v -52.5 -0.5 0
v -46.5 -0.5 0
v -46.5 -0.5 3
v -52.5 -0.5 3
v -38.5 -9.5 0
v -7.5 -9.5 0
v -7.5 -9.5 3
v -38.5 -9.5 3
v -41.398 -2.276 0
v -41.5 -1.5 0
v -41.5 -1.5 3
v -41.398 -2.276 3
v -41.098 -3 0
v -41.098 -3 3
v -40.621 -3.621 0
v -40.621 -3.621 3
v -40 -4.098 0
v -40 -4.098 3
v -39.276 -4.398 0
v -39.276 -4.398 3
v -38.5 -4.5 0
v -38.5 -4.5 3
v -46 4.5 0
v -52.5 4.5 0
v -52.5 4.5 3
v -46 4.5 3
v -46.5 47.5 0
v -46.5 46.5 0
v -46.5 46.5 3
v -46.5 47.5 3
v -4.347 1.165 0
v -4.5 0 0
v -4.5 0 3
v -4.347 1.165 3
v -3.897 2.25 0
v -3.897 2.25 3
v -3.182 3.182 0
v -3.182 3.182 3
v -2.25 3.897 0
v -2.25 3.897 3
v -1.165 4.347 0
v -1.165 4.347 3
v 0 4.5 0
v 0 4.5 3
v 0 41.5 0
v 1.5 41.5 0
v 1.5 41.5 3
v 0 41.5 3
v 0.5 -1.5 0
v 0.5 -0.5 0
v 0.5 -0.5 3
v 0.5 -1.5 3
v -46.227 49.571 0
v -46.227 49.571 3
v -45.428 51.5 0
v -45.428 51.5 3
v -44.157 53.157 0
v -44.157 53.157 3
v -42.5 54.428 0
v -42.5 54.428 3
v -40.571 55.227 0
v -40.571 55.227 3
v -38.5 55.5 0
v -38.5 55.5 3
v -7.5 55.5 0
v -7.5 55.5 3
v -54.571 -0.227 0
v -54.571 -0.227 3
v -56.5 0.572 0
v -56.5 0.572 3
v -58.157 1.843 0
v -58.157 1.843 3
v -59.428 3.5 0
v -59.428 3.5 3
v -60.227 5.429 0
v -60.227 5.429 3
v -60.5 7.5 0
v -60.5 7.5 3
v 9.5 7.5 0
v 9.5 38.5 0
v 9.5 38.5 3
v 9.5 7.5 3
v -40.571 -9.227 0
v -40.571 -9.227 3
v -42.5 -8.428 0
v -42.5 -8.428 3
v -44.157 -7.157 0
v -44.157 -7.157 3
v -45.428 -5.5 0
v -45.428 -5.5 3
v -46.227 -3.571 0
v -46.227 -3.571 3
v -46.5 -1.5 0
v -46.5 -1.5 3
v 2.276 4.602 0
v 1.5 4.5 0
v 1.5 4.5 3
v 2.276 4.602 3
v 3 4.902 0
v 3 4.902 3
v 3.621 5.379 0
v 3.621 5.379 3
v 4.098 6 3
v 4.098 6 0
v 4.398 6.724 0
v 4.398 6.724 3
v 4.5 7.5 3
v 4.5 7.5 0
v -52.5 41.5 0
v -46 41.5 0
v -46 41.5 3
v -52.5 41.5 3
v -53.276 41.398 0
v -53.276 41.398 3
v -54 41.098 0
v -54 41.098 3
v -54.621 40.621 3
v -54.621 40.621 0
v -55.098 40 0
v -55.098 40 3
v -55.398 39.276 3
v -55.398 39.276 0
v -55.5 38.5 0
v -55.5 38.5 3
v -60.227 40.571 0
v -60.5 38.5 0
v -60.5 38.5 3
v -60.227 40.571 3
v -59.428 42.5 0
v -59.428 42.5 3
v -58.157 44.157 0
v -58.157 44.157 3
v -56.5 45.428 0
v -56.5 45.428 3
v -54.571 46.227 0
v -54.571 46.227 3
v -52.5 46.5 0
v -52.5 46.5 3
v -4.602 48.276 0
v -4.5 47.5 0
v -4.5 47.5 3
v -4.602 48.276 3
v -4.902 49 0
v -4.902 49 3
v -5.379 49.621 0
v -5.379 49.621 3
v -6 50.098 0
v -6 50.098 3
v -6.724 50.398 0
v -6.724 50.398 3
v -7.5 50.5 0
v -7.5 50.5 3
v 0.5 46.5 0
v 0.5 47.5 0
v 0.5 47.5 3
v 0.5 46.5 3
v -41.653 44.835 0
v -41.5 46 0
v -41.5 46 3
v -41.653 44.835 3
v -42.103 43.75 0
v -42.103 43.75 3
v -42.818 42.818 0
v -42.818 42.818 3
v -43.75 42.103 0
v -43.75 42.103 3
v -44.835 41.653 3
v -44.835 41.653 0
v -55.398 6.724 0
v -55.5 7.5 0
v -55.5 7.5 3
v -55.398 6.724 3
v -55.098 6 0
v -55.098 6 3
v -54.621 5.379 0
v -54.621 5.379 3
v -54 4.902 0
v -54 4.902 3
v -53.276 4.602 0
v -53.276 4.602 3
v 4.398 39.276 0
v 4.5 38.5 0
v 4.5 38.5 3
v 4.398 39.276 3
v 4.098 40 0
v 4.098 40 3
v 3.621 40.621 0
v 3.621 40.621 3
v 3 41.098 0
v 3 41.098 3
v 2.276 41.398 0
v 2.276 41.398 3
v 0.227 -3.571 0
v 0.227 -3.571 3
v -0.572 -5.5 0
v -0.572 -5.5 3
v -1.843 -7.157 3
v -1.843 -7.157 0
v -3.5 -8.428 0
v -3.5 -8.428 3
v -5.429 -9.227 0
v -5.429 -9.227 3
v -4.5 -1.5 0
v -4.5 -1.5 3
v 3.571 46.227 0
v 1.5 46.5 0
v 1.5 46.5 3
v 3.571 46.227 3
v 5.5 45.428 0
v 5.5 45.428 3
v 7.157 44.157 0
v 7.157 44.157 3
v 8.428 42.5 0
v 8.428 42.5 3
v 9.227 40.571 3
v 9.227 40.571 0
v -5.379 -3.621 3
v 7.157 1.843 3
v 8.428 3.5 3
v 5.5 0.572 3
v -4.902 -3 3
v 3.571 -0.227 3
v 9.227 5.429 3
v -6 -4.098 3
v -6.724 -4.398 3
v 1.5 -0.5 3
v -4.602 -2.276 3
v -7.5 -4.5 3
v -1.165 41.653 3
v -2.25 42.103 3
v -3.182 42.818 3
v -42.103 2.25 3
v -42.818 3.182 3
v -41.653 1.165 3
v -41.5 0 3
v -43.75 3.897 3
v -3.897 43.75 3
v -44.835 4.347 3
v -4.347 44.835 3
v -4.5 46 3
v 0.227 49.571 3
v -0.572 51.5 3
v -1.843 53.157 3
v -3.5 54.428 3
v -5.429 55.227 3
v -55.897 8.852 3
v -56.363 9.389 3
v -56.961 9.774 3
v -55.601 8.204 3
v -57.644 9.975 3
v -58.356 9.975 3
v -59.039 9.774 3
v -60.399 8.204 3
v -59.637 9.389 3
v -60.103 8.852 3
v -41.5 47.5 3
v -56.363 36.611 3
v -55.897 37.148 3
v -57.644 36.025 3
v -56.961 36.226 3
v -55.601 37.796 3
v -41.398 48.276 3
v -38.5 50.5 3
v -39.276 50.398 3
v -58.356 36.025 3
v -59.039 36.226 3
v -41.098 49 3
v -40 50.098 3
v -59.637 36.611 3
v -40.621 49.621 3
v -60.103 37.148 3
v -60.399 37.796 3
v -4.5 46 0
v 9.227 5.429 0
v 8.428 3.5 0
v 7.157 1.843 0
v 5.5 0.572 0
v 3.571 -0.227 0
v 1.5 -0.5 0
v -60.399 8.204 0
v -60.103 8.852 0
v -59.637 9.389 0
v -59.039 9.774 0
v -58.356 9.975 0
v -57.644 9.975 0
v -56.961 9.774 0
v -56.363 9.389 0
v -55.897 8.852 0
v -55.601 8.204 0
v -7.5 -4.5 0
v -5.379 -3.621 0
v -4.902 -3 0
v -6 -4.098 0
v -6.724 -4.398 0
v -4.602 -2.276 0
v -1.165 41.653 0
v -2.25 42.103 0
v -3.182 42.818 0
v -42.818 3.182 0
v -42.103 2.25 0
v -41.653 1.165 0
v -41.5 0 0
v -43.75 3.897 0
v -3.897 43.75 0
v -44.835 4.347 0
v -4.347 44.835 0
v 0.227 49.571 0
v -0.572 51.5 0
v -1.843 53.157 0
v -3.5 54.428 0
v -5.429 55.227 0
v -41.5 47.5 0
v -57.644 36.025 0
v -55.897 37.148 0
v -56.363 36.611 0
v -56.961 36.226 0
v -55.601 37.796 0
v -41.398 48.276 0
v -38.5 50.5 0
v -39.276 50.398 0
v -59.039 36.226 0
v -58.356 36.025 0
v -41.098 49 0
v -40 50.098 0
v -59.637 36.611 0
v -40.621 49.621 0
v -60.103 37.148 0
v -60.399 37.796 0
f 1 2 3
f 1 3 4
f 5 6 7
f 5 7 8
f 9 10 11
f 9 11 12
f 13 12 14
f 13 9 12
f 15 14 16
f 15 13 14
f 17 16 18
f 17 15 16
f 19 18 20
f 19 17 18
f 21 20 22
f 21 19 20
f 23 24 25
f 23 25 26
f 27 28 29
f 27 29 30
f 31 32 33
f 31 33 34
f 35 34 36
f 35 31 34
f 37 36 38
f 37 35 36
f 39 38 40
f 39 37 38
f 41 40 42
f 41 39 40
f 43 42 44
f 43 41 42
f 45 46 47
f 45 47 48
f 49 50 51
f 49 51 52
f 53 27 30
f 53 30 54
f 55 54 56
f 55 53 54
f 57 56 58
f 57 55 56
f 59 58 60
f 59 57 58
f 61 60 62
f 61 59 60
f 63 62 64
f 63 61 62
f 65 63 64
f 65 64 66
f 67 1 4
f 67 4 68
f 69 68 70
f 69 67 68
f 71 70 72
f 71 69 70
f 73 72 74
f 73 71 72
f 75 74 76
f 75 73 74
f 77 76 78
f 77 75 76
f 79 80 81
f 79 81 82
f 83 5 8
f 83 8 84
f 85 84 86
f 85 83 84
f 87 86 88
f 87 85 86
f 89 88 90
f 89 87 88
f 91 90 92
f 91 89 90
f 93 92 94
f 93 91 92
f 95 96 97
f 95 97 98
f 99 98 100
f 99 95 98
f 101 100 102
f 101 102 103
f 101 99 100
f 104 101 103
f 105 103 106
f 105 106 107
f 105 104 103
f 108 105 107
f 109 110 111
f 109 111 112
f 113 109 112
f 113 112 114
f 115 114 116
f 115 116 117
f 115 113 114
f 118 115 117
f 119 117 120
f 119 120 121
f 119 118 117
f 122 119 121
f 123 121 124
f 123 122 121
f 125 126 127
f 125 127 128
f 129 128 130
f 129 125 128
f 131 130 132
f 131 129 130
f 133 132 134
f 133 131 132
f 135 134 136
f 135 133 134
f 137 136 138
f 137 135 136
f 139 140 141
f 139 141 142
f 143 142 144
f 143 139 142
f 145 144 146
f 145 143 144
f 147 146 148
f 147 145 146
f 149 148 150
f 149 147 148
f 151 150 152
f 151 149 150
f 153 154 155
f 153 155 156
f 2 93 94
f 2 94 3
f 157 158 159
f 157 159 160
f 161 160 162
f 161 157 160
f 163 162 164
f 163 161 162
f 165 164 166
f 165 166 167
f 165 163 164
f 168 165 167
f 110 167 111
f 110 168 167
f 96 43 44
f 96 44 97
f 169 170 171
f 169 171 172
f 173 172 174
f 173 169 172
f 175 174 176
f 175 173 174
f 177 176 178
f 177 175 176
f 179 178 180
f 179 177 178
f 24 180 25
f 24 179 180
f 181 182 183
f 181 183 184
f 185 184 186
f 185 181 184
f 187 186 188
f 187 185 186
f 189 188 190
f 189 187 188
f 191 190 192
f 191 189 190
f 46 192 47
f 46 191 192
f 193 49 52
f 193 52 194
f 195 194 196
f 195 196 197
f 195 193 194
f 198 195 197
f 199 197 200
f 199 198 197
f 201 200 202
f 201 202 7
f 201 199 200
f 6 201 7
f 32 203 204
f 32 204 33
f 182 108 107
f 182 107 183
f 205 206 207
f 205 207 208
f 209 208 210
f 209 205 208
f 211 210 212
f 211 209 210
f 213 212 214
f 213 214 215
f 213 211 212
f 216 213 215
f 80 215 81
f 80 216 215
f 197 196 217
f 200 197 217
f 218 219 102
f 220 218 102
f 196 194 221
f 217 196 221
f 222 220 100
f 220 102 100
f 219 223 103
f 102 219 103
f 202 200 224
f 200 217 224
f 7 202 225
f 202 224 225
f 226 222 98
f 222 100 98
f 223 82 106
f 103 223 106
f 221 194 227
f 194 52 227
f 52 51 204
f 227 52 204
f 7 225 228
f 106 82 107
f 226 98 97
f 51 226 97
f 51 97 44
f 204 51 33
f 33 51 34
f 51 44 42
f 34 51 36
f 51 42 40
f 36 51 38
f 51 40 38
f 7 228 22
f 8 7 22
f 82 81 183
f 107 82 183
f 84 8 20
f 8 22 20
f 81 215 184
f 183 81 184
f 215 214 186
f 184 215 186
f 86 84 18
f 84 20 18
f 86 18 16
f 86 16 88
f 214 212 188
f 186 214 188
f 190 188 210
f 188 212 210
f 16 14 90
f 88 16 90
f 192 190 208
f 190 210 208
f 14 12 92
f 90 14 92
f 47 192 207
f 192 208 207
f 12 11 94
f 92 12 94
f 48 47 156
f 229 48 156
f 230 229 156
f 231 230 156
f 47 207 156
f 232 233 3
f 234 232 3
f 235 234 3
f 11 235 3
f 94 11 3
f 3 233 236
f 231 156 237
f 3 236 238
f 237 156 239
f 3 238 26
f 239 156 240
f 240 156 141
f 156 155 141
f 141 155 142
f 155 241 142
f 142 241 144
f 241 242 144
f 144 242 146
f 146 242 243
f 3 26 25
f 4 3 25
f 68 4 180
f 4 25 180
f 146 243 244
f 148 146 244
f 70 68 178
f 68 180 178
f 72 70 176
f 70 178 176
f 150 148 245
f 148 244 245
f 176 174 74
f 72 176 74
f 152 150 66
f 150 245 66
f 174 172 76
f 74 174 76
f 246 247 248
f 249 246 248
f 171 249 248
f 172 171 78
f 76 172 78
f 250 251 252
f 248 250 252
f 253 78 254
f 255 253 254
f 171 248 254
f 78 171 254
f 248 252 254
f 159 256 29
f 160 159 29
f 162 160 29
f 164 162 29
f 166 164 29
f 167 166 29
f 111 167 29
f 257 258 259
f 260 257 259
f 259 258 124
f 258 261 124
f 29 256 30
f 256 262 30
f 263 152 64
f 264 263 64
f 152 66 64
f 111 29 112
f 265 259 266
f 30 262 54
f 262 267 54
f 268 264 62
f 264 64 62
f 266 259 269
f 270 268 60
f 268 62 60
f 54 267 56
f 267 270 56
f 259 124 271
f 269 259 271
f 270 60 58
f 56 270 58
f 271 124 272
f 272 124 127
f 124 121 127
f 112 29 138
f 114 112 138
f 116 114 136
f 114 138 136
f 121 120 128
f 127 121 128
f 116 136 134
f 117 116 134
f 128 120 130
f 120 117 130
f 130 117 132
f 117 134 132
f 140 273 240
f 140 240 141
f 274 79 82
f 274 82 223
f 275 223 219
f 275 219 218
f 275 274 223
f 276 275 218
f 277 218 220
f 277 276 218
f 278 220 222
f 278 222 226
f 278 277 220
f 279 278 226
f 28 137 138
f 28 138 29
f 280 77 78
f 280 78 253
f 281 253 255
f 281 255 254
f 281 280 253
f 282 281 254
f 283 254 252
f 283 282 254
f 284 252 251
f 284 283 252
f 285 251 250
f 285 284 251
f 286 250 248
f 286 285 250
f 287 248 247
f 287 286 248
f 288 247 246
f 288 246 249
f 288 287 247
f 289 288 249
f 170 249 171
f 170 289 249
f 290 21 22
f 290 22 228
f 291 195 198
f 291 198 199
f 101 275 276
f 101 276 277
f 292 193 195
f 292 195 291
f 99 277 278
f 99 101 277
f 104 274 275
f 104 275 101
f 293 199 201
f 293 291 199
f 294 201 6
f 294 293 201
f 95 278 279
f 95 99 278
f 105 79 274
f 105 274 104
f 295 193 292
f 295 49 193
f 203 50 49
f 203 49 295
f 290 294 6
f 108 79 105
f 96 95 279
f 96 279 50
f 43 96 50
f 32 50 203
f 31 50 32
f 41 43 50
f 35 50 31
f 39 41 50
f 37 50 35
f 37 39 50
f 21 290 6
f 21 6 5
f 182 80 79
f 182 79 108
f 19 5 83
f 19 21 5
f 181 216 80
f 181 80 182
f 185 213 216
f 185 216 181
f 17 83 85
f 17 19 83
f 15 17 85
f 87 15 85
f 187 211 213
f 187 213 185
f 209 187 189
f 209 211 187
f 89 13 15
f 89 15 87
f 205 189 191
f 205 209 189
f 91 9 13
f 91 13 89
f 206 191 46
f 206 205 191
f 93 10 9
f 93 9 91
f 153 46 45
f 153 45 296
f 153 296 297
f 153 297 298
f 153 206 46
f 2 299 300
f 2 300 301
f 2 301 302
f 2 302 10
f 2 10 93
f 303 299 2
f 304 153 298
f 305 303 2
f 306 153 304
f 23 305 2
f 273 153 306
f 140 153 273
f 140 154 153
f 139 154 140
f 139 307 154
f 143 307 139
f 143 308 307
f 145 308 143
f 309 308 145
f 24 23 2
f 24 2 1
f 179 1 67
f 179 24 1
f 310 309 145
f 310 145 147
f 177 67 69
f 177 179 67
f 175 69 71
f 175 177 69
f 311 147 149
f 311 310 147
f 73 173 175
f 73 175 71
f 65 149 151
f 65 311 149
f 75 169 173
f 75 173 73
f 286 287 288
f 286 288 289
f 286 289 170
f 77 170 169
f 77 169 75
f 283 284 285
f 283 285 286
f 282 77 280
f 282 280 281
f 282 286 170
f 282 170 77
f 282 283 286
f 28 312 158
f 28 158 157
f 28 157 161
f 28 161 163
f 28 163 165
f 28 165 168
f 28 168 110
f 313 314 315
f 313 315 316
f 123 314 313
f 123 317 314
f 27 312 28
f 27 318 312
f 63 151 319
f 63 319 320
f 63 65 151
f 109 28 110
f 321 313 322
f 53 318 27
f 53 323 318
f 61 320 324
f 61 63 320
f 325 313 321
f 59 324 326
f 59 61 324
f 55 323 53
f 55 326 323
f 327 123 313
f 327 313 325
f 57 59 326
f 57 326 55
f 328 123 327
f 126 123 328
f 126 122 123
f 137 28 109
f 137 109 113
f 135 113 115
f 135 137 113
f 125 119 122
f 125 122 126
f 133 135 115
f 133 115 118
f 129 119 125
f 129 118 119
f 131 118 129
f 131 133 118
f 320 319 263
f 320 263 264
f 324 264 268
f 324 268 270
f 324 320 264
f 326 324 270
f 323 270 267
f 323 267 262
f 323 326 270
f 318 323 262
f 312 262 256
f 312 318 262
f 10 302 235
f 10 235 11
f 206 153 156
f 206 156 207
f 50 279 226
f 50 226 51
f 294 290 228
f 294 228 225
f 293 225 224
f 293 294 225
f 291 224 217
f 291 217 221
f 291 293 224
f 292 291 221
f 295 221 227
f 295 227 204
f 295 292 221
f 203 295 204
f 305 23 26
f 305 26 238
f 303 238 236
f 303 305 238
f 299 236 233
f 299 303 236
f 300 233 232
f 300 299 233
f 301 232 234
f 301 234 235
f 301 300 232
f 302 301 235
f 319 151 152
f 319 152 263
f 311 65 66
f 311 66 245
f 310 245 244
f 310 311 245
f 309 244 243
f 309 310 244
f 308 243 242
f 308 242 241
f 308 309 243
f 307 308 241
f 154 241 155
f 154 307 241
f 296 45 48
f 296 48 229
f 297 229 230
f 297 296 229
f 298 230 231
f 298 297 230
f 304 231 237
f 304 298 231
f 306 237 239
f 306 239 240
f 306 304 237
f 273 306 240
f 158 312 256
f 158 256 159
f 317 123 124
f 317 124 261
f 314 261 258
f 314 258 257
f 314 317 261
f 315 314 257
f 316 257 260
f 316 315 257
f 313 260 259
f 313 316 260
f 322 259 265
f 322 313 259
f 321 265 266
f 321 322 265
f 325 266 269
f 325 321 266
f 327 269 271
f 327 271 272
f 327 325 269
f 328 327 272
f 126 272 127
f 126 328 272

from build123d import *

# Parameters (mm, degrees)
RESSALTO_EXTRUS_O1_DEPTH = 3


with BuildPart() as part:
    # Esboço1 → Ressalto-extrusão1 (new body)
    with BuildSketch(Plane.XY):
        with BuildLine():
            Line((-38.5, -4.5), (-7.5, -4.5))
            ThreePointArc((-7.5, -4.5), (-5.378679656, -3.621320344), (-4.5, -1.5))
            Line((-4.5, -1.5), (-4.5, 0))
            ThreePointArc((-4.5, 0), (-3.181980515, 3.181980515), (0, 4.5))
            Line((0, 4.5), (1.5, 4.5))
            ThreePointArc((1.5, 4.5), (3.621320344, 5.378679656), (4.5, 7.5))
            Line((4.5, 7.5), (4.5, 38.5))
            ThreePointArc((4.5, 38.5), (3.621320344, 40.621320344), (1.5, 41.5))
            Line((1.5, 41.5), (0, 41.5))
            ThreePointArc((0, 41.5), (-3.181980515, 42.818019485), (-4.5, 46))
            Line((-4.5, 46), (-4.5, 47.5))
            ThreePointArc((-4.5, 47.5), (-5.378679656, 49.621320344), (-7.5, 50.5))
            Line((-7.5, 50.5), (-38.5, 50.5))
            ThreePointArc((-38.5, 50.5), (-40.621320344, 49.621320344), (-41.5, 47.5))
            Line((-41.5, 47.5), (-41.5, 46))
            ThreePointArc((-41.5, 46), (-42.818019485, 42.818019485), (-46, 41.5))
            Line((-46, 41.5), (-52.5, 41.5))
            ThreePointArc((-52.5, 41.5), (-54.621320344, 40.621320344), (-55.5, 38.5))
            ThreePointArc((-55.5, 38.5), (-58, 36), (-60.5, 38.5))
            ThreePointArc((-60.5, 38.5), (-58.156854249, 44.156854249), (-52.5, 46.5))
            Line((-52.5, 46.5), (-46.5, 46.5))
            Line((-46.5, 46.5), (-46.5, 47.5))
            ThreePointArc((-46.5, 47.5), (-44.156854249, 53.156854249), (-38.5, 55.5))
            Line((-38.5, 55.5), (-7.5, 55.5))
            ThreePointArc((-7.5, 55.5), (-1.843145751, 53.156854249), (0.5, 47.5))
            Line((0.5, 47.5), (0.5, 46.5))
            Line((0.5, 46.5), (1.5, 46.5))
            ThreePointArc((1.5, 46.5), (7.156854249, 44.156854249), (9.5, 38.5))
            Line((9.5, 38.5), (9.5, 7.5))
            ThreePointArc((9.5, 7.5), (7.156854249, 1.843145751), (1.5, -0.5))
            Line((1.5, -0.5), (0.5, -0.5))
            Line((0.5, -0.5), (0.5, -1.5))
            ThreePointArc((0.5, -1.5), (-1.843145751, -7.156854249), (-7.5, -9.5))
            Line((-7.5, -9.5), (-38.5, -9.5))
            ThreePointArc((-38.5, -9.5), (-44.156854249, -7.156854249), (-46.5, -1.5))
            Line((-46.5, -1.5), (-46.5, -0.5))
            Line((-46.5, -0.5), (-52.5, -0.5))
            ThreePointArc((-52.5, -0.5), (-58.156854249, 1.843145751), (-60.5, 7.5))
            ThreePointArc((-60.5, 7.5), (-58, 10), (-55.5, 7.5))
            ThreePointArc((-55.5, 7.5), (-54.621320344, 5.378679656), (-52.5, 4.5))
            Line((-52.5, 4.5), (-46, 4.5))
            ThreePointArc((-46, 4.5), (-42.818019485, 3.181980515), (-41.5, 0))
            Line((-41.5, 0), (-41.5, -1.5))
            ThreePointArc((-41.5, -1.5), (-40.621320344, -3.621320344), (-38.5, -4.5))
        make_face()
    extrude(amount=RESSALTO_EXTRUS_O1_DEPTH)


solid = part.part
